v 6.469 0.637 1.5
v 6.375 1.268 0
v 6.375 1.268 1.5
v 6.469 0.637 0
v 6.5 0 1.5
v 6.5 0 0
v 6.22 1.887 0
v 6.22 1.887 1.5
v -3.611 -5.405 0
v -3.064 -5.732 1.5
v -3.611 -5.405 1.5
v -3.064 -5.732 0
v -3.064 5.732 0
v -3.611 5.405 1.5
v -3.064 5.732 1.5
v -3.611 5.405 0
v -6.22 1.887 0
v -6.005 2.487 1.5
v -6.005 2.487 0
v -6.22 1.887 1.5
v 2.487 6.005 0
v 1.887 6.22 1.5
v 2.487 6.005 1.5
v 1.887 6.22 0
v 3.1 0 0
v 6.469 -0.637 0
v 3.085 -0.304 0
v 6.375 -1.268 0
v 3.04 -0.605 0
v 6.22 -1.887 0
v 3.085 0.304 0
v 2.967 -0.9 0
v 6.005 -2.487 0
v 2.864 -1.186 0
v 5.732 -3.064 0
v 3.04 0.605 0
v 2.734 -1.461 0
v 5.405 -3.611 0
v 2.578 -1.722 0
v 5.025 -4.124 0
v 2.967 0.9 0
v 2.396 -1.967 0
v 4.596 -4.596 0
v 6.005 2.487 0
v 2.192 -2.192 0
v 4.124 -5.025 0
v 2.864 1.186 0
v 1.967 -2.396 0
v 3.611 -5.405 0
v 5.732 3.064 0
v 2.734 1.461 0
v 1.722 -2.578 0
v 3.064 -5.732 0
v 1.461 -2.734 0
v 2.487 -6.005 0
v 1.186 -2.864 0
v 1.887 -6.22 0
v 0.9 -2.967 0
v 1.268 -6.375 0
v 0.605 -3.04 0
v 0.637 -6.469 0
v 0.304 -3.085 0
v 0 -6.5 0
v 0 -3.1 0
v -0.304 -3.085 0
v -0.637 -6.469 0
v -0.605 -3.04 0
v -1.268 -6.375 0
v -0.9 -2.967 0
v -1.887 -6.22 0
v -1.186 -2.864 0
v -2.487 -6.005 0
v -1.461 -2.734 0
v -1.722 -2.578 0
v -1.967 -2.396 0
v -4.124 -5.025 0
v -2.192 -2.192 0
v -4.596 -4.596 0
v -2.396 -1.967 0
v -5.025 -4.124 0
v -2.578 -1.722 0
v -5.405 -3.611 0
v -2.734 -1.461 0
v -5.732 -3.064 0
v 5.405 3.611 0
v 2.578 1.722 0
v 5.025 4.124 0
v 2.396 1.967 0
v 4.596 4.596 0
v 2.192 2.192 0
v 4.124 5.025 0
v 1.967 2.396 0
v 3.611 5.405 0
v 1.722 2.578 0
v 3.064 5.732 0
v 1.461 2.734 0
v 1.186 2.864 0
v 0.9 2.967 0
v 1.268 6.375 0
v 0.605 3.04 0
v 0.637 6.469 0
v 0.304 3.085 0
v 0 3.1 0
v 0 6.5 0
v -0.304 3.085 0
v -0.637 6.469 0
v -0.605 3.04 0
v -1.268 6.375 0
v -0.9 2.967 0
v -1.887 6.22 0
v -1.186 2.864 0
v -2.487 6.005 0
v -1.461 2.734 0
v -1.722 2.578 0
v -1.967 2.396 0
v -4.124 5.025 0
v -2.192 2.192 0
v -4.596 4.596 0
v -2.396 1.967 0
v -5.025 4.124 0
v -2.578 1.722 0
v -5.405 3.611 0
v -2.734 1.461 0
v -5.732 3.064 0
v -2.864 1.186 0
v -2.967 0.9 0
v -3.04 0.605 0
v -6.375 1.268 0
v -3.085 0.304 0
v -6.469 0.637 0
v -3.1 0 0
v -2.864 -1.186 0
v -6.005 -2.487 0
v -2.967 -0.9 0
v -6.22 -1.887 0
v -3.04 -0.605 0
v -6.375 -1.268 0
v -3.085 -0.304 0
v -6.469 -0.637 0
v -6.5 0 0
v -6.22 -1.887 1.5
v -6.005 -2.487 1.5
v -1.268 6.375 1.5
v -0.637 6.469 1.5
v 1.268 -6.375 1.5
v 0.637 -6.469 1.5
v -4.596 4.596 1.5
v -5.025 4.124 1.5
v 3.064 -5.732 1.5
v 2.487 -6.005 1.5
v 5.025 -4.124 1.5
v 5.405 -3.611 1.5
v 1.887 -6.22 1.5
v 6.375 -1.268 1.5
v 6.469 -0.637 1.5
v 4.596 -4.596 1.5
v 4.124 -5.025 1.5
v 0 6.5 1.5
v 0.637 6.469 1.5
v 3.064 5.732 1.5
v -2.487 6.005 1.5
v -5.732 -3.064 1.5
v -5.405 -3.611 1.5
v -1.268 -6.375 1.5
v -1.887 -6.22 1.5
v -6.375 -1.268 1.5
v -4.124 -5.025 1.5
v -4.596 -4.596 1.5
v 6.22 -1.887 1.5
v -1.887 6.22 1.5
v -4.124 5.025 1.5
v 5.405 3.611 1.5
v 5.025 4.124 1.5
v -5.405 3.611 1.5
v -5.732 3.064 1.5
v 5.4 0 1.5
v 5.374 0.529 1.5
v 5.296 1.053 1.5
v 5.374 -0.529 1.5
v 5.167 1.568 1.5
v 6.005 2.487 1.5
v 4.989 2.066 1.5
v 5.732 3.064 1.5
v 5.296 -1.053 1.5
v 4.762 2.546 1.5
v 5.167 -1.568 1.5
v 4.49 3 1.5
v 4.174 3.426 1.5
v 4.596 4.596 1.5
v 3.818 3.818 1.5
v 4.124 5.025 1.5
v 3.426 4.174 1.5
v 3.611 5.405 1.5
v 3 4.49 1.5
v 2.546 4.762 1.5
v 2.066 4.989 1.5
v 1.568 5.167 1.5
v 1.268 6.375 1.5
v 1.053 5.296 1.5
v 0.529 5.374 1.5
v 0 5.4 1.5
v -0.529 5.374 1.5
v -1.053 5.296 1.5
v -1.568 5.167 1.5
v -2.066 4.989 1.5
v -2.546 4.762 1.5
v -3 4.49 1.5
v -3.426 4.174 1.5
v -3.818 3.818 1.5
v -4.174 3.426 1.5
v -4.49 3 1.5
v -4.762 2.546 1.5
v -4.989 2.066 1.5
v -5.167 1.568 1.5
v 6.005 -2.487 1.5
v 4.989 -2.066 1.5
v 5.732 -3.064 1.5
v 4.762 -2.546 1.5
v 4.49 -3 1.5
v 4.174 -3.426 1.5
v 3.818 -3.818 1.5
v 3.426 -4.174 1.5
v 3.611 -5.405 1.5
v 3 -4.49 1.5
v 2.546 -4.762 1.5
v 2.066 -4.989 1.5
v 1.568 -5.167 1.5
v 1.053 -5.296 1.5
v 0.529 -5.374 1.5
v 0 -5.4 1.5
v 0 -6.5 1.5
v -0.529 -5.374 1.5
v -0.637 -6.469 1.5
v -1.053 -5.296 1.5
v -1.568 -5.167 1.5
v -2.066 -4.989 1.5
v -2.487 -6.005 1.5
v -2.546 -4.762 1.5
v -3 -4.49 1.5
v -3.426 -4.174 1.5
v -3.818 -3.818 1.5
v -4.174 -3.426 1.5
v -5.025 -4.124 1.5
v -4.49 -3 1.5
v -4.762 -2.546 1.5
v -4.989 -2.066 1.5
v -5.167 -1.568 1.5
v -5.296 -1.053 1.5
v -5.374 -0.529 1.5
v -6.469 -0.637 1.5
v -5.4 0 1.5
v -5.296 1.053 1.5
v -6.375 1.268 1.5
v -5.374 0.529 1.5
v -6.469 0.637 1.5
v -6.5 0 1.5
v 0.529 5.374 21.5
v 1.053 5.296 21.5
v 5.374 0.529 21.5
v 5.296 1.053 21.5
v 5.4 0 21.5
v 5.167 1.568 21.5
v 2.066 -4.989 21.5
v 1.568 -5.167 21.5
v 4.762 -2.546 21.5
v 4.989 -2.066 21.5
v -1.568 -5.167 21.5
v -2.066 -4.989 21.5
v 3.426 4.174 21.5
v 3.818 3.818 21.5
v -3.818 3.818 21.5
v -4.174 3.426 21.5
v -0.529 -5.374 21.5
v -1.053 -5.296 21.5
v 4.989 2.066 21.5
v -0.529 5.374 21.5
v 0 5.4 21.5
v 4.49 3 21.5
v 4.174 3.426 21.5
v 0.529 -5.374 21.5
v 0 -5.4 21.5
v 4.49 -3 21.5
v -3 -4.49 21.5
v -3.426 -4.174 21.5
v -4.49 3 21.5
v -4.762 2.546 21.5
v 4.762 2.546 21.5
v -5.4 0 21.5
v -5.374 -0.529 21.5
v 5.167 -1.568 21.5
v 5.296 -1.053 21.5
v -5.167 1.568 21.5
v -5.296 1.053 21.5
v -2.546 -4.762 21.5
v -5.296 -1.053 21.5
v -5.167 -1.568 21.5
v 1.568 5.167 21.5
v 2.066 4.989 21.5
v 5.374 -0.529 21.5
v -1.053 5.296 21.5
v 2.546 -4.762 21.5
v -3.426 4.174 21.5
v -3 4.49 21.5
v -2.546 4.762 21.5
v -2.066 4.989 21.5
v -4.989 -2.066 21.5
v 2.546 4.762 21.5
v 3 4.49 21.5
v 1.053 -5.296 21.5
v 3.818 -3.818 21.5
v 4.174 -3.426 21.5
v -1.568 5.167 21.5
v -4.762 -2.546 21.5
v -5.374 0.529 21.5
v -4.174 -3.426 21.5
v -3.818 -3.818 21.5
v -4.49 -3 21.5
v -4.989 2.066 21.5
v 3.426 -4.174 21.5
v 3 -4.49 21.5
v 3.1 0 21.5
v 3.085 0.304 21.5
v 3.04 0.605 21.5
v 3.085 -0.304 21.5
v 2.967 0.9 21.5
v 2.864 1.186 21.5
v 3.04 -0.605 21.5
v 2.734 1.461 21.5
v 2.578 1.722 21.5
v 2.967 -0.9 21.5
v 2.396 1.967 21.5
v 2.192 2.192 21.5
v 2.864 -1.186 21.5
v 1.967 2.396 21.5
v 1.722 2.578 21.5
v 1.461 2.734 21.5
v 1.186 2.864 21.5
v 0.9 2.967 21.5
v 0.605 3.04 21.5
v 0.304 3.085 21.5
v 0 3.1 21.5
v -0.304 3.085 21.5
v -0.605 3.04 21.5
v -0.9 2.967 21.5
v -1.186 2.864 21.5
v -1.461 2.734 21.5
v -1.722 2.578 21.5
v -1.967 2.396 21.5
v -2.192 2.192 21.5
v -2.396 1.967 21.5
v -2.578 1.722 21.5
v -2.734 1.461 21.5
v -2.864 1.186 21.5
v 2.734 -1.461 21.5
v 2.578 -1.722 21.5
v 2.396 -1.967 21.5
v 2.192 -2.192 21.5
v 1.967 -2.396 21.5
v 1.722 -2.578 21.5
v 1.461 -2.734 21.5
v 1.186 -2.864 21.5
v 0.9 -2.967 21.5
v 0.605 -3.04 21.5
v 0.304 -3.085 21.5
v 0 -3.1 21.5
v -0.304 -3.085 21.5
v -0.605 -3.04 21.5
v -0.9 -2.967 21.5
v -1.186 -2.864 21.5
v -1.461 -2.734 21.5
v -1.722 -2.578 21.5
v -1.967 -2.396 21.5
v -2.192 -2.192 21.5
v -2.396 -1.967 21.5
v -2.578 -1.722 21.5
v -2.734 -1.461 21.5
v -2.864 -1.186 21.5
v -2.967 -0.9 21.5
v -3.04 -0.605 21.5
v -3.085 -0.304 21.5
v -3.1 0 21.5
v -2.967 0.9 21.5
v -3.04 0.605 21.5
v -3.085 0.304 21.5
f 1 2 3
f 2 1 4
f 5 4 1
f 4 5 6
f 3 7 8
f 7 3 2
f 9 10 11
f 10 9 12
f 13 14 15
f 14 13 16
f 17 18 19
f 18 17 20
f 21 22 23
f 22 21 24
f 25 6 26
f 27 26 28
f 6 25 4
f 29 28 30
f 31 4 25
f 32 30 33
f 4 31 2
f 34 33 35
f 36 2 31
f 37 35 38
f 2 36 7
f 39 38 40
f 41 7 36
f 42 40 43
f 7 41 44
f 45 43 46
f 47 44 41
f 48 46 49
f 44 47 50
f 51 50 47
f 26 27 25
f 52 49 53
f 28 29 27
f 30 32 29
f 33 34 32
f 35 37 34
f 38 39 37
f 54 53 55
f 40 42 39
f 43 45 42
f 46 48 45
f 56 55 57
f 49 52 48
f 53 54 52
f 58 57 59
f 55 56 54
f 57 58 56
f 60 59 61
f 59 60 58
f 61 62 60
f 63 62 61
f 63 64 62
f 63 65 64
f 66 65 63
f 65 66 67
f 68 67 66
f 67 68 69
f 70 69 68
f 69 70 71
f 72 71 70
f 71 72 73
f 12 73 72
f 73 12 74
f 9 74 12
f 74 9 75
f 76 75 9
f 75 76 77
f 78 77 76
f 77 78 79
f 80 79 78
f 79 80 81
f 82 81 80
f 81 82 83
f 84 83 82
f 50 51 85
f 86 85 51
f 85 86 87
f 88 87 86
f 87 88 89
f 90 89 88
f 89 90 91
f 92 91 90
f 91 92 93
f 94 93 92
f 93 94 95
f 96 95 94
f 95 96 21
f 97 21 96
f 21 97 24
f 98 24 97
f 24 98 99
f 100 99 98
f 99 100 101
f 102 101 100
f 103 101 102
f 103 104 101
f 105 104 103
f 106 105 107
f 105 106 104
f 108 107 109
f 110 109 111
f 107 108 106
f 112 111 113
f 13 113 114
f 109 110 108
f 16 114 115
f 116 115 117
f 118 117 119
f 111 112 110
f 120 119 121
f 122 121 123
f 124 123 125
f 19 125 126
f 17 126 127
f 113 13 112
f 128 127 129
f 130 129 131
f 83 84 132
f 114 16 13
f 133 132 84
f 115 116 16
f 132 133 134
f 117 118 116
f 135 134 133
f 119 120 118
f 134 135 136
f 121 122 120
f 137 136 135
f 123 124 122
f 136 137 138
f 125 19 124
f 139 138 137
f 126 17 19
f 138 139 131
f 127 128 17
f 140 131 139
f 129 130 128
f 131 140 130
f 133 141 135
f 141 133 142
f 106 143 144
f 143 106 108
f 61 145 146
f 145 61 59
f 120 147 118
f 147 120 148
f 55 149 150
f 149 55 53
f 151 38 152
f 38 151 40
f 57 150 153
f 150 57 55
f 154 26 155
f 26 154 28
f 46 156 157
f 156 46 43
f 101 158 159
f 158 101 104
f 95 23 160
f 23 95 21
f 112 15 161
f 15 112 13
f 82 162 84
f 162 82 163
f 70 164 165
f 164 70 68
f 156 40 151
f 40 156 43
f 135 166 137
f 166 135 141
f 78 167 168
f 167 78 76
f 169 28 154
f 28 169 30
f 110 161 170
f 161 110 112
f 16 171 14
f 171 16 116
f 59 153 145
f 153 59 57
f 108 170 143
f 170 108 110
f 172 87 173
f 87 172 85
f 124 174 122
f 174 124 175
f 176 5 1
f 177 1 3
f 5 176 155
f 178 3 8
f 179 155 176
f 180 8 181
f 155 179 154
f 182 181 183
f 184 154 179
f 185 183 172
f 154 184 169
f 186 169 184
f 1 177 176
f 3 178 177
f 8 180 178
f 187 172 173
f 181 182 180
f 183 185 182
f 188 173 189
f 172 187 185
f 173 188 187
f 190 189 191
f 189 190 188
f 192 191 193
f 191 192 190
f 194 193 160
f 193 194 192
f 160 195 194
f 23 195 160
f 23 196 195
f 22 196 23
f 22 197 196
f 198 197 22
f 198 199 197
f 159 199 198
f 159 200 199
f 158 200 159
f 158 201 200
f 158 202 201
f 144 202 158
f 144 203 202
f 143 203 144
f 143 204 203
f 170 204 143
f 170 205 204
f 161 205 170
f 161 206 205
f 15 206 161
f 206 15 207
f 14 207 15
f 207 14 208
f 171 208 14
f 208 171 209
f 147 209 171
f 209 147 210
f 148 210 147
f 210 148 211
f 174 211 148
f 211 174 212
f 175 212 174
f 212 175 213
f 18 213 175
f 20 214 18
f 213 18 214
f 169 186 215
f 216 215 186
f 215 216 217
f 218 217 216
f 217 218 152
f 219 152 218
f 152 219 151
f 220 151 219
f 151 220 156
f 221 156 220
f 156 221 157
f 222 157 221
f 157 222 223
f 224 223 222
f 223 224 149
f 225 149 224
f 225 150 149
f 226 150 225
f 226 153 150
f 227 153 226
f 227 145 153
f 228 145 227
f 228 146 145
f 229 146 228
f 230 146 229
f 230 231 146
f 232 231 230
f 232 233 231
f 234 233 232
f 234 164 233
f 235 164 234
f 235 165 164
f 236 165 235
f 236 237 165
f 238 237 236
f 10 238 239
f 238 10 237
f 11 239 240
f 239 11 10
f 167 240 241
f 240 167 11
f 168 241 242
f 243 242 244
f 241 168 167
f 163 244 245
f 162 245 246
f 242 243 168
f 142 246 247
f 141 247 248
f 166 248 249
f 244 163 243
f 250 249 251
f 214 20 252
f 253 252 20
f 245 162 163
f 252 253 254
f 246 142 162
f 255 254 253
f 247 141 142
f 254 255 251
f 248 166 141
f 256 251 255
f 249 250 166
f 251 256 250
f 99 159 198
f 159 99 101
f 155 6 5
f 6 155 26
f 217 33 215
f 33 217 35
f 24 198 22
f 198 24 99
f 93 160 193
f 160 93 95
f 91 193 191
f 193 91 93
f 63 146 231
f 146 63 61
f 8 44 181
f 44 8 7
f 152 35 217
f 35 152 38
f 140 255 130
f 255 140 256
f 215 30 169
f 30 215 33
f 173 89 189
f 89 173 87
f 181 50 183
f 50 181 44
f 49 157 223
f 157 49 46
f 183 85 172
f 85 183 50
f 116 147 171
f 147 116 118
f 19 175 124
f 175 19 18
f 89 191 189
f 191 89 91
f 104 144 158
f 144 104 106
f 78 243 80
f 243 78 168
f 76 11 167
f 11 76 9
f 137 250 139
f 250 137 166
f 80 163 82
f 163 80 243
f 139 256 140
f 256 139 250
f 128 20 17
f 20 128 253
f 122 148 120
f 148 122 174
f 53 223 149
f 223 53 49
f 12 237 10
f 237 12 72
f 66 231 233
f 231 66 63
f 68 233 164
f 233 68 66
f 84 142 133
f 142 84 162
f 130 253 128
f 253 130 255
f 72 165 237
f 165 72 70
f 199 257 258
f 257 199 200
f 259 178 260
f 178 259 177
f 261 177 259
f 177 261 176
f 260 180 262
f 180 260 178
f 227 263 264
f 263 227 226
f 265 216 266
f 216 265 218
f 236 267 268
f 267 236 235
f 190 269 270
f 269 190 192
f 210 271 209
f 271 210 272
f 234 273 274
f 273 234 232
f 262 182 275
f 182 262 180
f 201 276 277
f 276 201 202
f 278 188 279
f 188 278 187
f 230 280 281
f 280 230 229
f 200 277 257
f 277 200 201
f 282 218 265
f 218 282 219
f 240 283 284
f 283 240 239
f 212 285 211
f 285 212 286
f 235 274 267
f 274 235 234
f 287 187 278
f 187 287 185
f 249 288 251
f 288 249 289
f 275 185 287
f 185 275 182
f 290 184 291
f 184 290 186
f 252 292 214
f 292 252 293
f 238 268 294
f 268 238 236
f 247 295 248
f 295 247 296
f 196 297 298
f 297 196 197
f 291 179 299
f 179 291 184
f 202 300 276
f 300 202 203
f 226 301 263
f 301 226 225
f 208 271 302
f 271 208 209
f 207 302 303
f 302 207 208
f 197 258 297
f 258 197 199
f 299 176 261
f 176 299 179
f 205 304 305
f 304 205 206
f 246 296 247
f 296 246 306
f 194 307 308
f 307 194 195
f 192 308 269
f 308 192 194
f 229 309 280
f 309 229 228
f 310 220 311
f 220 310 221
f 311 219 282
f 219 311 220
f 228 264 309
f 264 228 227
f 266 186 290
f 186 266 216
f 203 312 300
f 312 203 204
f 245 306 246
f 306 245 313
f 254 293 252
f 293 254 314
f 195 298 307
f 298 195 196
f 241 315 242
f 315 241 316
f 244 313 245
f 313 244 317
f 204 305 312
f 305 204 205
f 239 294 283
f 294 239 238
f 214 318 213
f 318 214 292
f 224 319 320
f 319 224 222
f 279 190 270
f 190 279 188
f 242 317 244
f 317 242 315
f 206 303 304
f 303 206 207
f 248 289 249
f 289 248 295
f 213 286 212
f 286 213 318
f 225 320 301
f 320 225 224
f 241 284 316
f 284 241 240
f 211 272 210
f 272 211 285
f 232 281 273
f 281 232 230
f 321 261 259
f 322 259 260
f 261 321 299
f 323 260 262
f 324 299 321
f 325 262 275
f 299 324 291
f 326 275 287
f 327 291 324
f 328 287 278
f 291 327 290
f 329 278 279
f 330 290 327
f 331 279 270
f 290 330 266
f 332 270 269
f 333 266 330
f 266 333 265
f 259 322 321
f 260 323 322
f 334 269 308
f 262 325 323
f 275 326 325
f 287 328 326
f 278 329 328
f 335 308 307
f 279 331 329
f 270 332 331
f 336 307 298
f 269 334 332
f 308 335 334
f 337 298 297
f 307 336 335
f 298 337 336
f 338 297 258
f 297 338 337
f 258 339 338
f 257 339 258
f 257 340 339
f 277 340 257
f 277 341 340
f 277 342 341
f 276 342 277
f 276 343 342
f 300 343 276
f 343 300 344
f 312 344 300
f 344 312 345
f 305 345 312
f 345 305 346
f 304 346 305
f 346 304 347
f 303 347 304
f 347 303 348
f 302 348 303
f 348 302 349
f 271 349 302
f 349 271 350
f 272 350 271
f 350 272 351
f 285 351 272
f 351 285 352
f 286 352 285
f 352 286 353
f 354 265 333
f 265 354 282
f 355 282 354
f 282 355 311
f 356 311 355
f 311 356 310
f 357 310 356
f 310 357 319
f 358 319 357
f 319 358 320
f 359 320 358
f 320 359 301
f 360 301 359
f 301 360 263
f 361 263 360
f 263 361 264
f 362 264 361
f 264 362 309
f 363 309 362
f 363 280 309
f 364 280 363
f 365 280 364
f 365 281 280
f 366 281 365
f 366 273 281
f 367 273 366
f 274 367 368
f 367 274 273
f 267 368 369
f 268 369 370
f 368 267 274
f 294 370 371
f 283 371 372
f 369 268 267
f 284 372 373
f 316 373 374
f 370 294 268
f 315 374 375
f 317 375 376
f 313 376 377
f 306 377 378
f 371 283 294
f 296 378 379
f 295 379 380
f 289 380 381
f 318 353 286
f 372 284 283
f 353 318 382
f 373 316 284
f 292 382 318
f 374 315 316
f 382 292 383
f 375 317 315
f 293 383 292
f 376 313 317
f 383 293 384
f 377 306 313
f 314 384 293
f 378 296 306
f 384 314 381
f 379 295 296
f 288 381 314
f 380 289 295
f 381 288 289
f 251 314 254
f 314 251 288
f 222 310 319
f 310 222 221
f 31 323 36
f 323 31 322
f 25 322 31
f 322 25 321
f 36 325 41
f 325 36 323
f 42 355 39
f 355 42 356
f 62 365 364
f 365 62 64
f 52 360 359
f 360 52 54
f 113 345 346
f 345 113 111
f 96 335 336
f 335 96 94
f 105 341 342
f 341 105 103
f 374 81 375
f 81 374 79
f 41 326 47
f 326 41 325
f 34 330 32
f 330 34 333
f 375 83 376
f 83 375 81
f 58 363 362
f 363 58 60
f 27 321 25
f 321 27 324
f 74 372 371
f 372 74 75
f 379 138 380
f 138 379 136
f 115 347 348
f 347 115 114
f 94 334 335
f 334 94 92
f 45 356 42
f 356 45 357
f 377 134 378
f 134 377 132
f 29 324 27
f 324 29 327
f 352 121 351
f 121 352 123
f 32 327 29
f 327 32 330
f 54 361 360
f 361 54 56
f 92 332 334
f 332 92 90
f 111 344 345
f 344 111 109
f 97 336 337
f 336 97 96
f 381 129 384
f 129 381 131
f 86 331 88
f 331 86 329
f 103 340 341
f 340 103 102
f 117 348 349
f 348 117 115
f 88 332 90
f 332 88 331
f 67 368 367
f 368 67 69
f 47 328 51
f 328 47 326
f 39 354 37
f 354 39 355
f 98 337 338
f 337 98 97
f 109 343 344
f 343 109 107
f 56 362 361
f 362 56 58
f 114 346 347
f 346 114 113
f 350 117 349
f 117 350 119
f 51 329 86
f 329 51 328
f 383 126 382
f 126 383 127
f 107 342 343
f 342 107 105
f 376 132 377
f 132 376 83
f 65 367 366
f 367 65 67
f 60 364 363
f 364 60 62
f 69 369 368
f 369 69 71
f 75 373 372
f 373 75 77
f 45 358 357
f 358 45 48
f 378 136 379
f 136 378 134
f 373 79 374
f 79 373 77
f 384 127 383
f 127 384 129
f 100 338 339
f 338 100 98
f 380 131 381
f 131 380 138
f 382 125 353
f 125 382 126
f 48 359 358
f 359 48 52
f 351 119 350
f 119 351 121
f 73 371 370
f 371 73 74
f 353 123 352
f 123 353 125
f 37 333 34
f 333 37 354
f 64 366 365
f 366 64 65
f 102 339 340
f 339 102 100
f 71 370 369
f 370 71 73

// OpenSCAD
// Adapter sleeve for 0.2 mL PCR tube in 1.5 mL rack hole
// Printed upside down: collar on bed, sleeve rises up

// Collar dimensions
collar_d = 13;
collar_h = 1.5;

// Sleeve dimensions
sleeve_od = 10.8;
total_h = 21.5;
sleeve_h = total_h - collar_h;

// Bore dimensions
bore_d = 6.2;
bore_h = total_h + 0.1;

// Build part
difference() {
    union() {
        // Collar
        cylinder(d=collar_d, h=collar_h, $fn=64);
        
        // Sleeve body
        translate([0, 0, collar_h]) {
            cylinder(d=sleeve_od, h=sleeve_h, $fn=64);
        }
    }
    
    // Cut bore
    cylinder(d=bore_d, h=bore_h, $fn=64);
}
